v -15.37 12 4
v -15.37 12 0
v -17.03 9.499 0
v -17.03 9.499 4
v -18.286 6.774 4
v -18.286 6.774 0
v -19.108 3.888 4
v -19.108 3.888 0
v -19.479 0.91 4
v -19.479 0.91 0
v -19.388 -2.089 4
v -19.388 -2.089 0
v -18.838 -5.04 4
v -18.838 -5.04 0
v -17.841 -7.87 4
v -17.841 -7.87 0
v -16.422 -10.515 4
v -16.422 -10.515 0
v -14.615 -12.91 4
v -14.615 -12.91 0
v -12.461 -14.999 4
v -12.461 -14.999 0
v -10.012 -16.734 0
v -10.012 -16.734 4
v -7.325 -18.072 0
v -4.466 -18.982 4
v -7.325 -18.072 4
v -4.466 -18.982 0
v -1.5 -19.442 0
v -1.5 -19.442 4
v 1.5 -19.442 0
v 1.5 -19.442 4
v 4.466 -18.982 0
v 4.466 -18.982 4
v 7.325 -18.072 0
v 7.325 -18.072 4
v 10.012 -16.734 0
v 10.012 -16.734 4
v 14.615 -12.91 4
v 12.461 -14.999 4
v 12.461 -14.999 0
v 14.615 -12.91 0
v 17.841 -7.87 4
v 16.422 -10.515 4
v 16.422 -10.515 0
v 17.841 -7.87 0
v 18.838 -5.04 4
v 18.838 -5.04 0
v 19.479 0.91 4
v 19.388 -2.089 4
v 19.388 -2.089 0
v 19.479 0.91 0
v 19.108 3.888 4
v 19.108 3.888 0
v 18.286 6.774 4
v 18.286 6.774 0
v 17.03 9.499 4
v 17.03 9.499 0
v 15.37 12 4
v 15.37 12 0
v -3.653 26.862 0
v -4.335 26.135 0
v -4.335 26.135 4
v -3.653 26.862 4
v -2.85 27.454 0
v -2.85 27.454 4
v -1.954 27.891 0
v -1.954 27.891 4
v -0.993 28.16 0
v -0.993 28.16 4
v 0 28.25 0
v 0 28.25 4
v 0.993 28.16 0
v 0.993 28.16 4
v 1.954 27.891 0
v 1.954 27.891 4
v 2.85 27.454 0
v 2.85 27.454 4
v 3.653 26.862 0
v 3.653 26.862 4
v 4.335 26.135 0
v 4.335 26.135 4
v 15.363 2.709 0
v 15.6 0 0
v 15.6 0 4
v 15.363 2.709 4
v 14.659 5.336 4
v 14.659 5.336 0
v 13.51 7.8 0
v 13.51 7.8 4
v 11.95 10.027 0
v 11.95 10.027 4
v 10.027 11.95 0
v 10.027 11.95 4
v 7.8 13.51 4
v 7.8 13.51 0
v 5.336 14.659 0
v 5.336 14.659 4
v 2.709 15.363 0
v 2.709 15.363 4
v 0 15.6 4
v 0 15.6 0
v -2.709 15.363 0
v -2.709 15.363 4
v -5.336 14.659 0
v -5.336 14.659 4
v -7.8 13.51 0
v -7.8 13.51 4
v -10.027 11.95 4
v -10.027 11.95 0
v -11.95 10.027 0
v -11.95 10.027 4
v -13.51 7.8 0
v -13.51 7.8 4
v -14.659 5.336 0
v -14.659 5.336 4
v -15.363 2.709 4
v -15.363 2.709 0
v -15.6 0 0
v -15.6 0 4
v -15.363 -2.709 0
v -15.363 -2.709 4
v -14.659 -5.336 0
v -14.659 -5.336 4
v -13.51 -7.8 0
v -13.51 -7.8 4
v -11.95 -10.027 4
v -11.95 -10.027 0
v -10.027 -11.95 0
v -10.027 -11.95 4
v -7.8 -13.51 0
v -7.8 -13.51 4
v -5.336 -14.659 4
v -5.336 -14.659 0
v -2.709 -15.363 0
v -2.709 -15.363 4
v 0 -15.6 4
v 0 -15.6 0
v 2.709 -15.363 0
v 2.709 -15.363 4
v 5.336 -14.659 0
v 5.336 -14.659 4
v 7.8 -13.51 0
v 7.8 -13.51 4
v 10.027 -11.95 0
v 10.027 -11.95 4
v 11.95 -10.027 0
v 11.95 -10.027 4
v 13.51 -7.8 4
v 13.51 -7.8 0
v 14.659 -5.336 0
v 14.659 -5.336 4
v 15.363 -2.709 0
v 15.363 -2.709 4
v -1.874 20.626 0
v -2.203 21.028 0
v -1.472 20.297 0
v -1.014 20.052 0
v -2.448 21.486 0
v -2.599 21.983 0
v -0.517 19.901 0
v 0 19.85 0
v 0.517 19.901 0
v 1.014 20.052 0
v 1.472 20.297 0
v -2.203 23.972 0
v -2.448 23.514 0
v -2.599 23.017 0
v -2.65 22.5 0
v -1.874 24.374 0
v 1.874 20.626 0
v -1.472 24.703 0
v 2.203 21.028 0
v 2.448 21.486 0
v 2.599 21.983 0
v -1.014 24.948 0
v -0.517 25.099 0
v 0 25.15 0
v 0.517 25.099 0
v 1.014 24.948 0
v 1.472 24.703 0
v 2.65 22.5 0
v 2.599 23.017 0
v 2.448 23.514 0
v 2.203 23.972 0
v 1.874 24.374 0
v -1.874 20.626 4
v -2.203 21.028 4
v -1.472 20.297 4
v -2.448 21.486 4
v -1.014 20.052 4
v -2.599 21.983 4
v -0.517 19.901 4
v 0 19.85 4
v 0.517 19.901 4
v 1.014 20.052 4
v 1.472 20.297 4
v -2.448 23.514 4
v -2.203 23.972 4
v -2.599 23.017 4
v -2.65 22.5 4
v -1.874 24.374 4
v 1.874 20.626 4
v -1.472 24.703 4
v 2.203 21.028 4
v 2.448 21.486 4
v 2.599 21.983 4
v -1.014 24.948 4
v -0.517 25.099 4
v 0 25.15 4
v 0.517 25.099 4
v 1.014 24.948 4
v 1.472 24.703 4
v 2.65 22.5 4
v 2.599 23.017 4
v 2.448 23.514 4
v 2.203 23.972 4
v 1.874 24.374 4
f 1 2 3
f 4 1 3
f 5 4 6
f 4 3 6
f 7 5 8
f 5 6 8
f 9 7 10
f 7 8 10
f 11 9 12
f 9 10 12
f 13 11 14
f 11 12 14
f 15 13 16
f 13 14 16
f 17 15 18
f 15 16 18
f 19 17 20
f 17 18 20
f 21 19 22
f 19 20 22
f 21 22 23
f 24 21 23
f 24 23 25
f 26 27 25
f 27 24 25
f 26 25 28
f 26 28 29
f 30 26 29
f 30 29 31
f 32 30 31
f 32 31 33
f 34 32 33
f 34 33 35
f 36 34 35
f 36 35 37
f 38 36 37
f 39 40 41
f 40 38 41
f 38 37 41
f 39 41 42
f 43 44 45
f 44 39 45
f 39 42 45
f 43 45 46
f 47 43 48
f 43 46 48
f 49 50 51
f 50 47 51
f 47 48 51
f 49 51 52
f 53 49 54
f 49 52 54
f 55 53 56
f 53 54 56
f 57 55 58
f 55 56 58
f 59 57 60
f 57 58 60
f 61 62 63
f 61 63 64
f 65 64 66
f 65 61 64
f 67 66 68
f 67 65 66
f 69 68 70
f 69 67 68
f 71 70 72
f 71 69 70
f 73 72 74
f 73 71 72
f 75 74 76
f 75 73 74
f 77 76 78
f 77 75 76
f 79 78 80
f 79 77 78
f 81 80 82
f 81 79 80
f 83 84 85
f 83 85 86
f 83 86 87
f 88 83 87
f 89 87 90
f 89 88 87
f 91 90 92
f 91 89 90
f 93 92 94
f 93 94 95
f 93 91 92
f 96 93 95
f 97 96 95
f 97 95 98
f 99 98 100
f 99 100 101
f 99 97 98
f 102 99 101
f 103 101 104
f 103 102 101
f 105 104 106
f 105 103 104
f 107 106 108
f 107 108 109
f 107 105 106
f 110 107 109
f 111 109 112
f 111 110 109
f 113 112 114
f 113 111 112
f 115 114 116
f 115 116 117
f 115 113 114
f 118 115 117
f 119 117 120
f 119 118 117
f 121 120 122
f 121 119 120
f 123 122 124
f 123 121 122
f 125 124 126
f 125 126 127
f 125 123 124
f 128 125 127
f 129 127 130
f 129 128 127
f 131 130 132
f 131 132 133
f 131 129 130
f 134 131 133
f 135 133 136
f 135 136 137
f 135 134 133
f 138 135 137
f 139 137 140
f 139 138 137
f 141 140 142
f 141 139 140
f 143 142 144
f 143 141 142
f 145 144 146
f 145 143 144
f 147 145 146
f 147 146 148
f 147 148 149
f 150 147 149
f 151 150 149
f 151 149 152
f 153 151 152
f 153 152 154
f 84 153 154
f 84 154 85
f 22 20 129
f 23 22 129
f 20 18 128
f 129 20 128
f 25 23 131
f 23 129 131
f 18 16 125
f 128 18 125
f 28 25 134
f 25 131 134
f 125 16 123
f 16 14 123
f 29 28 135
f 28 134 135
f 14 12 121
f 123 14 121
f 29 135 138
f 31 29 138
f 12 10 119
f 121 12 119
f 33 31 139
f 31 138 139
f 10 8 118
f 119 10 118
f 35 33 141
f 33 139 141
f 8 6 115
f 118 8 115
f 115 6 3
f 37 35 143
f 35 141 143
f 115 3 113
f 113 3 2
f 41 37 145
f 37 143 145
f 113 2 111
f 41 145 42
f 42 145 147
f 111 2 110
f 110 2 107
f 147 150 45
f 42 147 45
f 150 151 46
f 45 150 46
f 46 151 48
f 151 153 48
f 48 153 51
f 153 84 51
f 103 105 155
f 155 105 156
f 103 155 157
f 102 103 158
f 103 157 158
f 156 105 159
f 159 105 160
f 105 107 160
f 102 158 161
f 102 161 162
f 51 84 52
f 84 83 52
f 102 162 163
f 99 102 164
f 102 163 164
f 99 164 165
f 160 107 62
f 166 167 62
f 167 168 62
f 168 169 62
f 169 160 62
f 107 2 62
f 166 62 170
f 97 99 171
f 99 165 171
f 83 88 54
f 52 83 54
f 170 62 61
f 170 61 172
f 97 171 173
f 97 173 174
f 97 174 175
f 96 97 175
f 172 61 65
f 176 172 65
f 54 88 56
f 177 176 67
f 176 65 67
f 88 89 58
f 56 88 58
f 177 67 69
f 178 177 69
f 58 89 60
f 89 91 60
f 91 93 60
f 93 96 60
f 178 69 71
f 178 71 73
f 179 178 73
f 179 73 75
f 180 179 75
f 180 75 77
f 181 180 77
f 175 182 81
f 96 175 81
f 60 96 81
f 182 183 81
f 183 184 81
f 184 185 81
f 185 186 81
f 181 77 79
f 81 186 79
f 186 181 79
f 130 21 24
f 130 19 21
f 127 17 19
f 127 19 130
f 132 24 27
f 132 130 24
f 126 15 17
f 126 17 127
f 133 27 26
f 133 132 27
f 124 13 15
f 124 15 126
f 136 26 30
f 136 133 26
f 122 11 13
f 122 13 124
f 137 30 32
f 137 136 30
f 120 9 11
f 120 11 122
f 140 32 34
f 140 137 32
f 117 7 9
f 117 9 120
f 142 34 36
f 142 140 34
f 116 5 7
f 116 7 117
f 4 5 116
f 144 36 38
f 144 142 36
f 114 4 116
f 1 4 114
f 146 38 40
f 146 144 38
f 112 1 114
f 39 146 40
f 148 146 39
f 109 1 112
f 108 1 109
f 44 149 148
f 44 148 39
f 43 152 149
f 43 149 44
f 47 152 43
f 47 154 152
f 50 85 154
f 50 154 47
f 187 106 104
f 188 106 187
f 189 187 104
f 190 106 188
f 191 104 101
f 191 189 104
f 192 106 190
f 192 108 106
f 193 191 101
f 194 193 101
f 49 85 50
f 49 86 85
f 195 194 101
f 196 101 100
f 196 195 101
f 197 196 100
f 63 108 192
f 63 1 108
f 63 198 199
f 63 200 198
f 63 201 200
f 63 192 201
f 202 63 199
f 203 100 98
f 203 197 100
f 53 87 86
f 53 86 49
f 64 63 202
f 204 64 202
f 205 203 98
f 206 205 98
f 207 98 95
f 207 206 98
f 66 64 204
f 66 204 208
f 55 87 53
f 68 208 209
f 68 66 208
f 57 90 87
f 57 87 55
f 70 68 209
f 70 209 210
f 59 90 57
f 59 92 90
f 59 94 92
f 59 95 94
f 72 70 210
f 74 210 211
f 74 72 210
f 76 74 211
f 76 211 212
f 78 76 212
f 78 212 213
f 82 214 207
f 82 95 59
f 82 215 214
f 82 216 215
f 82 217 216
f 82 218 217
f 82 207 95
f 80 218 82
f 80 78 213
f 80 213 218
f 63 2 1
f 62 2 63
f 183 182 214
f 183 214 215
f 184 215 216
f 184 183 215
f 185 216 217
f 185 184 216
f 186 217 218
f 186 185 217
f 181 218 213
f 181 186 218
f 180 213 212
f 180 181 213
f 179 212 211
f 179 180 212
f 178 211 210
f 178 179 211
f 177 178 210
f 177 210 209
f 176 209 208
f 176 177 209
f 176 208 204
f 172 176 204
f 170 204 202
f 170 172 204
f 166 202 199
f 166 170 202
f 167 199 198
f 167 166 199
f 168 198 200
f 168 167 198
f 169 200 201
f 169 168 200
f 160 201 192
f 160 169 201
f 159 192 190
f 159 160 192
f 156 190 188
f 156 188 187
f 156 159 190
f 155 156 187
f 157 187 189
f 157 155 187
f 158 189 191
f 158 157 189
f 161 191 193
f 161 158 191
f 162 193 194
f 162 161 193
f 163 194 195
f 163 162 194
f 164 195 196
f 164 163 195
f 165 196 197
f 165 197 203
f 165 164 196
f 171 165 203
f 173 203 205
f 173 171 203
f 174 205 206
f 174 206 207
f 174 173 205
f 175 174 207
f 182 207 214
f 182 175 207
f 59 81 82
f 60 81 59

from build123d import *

# Parameters (mm, degrees)
SKETCH1_R           = 19.5
SKETCH1_R_2         = 15.6
BOSS_EXTRUDE1_DEPTH = 4
SKETCH3_R           = 2.65
BOSS_EXTRUDE2_DEPTH = 4


with BuildPart() as part:
    # Sketch1 → Boss-Extrude1 (new body)
    with BuildSketch(Plane.XY):
        Circle(SKETCH1_R)
        Circle(SKETCH1_R_2, mode=Mode.SUBTRACT)
    extrude(amount=BOSS_EXTRUDE1_DEPTH)

    # Sketch3 → Boss-Extrude2 (add)
    with BuildSketch(Plane.XY):
        with BuildLine():
            Line((-15.370426149, 12), (-4.335248401, 26.134615385))
            ThreePointArc((-4.335248401, 26.134615385), (0, 28.25), (4.335248401, 26.134615385))
            Line((4.335248401, 26.134615385), (15.370426149, 12))
            ThreePointArc((15.370426149, 12), (0, 19.5), (-15.370426149, 12))
        make_face()
        with Locations((0, 22.5)):
            Circle(SKETCH3_R, mode=Mode.SUBTRACT)
    extrude(amount=BOSS_EXTRUDE2_DEPTH)


solid = part.part
